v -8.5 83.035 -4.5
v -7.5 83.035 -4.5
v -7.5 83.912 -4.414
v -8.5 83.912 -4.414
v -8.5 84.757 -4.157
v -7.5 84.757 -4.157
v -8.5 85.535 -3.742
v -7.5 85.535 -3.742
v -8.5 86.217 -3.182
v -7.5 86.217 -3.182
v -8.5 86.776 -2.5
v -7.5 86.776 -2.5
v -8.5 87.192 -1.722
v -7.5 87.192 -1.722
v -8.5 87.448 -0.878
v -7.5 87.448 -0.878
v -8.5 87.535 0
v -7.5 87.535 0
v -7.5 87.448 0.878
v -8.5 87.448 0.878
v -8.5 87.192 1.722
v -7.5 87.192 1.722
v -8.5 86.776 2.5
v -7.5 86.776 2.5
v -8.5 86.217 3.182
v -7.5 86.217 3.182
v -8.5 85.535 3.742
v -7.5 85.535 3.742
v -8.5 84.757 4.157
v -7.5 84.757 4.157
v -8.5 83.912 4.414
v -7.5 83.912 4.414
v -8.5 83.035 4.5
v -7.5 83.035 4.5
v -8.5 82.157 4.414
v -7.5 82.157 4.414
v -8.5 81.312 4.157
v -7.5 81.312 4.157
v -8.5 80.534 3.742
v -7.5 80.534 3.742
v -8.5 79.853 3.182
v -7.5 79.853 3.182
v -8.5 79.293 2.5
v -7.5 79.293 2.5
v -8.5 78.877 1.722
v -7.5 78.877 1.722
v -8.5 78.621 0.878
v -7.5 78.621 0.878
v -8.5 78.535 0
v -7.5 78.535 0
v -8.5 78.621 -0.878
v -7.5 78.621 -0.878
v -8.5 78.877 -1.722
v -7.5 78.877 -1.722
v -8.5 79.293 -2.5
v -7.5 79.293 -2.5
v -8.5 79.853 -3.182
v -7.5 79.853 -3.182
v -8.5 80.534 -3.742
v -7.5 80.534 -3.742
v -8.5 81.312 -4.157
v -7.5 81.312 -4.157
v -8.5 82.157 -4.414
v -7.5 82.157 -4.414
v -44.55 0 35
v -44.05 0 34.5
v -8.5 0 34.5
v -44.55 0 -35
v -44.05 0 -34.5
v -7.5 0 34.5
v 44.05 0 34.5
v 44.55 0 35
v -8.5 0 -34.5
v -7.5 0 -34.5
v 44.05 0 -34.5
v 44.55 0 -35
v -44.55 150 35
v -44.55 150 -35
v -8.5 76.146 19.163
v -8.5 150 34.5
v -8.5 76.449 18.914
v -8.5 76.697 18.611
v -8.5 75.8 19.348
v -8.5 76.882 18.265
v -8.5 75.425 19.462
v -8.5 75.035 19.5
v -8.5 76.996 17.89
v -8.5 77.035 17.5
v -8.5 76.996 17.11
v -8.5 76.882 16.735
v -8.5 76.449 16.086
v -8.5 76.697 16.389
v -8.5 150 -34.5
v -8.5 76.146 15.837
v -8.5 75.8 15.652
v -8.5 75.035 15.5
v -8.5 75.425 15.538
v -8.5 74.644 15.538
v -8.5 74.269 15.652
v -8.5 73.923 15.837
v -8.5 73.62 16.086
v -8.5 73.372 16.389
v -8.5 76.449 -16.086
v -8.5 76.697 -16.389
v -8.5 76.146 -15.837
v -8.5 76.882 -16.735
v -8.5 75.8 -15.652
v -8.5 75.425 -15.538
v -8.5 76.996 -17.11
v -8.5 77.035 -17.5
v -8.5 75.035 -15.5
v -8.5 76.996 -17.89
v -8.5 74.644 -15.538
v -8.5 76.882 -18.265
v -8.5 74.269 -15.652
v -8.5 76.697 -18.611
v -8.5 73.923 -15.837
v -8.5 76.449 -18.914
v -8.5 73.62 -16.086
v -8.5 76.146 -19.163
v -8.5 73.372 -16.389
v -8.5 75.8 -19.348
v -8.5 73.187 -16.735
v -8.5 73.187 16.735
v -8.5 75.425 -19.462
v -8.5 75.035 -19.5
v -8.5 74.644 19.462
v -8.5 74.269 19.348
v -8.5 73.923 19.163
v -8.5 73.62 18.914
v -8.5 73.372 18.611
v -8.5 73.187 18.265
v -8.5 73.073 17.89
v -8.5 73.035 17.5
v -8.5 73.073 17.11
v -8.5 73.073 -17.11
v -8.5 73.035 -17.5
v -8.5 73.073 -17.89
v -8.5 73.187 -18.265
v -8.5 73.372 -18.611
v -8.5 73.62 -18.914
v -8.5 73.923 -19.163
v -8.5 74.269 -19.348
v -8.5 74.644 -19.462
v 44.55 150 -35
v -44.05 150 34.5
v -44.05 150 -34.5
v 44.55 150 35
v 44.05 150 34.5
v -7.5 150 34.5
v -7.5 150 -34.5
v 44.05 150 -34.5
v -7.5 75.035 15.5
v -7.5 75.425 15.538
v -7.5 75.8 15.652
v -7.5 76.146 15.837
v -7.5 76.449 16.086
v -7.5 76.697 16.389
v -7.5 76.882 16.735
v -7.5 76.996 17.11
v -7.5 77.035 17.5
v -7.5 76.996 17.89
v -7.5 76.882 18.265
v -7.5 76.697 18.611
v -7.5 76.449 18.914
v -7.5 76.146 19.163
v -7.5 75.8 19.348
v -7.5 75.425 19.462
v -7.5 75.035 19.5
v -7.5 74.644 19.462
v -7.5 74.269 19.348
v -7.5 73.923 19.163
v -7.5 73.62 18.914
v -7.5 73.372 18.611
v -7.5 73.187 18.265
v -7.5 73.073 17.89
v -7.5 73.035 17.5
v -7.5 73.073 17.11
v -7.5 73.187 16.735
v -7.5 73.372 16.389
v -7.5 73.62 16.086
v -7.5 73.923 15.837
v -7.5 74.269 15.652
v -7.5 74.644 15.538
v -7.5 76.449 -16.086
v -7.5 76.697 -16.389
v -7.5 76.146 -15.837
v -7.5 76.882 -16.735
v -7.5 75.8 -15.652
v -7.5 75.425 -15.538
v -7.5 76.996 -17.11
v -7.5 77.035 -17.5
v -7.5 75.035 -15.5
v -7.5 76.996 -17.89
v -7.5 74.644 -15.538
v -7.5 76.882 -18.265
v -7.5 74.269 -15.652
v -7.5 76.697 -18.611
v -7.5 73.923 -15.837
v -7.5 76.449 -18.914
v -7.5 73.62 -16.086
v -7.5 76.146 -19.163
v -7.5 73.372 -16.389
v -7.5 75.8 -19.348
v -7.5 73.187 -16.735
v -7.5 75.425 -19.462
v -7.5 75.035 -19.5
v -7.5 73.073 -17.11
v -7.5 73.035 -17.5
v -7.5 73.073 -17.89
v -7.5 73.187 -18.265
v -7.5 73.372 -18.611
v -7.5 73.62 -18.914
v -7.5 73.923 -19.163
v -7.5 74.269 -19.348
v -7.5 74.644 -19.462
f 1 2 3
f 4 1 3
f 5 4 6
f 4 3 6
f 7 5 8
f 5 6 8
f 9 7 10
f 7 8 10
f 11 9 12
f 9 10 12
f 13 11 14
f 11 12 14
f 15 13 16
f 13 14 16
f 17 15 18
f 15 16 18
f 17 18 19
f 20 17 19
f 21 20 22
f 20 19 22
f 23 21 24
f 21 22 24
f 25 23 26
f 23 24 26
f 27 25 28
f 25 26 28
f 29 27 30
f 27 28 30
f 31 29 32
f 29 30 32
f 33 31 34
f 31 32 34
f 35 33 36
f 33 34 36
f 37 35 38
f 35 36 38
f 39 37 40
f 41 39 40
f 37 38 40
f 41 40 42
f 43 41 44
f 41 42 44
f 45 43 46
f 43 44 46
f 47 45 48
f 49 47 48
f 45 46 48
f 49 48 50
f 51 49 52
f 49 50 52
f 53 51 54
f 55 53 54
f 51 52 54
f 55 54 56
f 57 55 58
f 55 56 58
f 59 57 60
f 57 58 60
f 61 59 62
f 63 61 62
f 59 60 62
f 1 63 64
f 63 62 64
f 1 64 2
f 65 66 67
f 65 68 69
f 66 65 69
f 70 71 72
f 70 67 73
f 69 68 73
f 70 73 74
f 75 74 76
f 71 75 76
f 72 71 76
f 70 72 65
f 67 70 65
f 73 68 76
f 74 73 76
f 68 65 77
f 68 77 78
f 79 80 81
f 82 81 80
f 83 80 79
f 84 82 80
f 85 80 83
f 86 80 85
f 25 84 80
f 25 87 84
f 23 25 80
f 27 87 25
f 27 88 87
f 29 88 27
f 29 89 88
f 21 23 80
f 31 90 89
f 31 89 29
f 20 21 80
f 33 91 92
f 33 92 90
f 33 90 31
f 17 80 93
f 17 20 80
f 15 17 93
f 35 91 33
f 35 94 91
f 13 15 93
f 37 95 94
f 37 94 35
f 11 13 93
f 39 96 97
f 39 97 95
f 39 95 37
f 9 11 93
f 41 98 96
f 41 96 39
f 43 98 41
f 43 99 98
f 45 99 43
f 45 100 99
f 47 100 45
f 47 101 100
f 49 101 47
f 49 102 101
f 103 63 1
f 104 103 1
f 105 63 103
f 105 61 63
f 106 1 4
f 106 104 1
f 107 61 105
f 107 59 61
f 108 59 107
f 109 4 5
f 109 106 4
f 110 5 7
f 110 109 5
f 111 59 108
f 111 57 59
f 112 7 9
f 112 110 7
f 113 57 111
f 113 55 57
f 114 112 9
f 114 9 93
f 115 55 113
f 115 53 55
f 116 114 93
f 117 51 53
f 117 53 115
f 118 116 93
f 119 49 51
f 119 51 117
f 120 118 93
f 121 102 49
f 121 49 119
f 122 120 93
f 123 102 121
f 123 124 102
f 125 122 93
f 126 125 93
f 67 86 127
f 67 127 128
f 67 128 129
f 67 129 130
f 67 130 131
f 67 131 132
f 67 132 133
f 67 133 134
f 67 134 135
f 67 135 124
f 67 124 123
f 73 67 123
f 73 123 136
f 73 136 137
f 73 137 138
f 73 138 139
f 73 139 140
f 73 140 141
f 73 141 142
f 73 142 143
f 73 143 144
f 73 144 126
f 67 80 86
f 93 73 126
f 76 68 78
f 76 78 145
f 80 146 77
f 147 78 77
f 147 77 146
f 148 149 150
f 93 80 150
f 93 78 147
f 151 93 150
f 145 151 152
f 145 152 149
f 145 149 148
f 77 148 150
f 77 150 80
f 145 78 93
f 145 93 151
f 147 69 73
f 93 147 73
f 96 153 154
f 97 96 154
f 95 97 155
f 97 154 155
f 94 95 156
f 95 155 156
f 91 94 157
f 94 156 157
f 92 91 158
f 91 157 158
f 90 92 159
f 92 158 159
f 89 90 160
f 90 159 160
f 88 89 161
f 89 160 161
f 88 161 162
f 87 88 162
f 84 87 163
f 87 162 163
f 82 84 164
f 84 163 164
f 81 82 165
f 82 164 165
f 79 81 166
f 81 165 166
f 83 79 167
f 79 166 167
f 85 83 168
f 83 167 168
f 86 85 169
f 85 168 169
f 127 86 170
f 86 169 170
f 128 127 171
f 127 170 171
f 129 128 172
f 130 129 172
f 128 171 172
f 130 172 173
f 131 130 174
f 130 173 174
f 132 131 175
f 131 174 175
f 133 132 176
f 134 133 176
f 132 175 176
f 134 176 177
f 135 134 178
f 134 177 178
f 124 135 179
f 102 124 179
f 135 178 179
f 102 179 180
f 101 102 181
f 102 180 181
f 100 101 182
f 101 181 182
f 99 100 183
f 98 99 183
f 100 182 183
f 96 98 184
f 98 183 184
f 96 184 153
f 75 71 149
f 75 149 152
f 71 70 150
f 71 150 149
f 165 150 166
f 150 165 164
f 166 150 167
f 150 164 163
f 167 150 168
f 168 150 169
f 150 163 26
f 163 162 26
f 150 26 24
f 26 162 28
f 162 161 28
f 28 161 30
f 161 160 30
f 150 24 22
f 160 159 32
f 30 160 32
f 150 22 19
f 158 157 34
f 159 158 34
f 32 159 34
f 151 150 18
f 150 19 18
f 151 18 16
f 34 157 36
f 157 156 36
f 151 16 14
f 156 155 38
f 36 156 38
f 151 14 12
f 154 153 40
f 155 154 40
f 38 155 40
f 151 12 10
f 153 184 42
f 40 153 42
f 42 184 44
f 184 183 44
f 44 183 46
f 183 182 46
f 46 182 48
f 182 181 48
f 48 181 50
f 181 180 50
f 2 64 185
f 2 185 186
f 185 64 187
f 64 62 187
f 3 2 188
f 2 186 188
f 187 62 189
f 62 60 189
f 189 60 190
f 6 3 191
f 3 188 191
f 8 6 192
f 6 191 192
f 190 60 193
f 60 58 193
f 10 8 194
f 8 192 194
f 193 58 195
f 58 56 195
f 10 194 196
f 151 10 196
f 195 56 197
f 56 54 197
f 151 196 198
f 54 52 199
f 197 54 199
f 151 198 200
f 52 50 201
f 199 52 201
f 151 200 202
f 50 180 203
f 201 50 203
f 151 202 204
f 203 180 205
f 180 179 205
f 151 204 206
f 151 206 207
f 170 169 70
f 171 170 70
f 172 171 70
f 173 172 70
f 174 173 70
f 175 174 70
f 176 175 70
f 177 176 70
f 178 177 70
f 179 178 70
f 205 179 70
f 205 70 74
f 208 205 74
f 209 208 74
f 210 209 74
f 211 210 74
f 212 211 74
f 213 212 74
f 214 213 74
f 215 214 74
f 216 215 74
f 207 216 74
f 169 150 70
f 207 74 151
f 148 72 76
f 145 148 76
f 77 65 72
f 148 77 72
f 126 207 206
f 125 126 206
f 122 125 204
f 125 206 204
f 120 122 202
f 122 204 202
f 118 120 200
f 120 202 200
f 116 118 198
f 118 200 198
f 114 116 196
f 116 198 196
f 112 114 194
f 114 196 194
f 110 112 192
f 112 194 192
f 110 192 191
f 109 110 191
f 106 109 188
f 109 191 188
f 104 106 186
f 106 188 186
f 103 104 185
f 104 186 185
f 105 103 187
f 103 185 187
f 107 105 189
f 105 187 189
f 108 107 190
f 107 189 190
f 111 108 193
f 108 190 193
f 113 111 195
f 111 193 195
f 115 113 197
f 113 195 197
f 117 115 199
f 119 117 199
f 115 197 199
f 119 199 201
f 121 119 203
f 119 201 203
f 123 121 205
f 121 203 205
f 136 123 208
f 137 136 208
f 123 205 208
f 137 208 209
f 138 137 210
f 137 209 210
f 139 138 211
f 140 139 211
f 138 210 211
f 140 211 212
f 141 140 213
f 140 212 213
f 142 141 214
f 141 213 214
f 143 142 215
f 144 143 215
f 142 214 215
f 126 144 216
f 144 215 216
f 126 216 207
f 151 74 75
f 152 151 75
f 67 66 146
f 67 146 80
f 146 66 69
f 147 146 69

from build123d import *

# Parameters (mm, degrees)
ESBO_O1_W                = 89.1
ESBO_O1_H                = 70
ESBO_O1_W_2              = 51.55
ESBO_O1_H_2              = 69
ESBO_O1_W_3              = 35.55
RESSALTO_EXTRUS_O1_DEPTH = 150
ESBO_O3_R                = 2
ESBO_O3_R_2              = 4.5
CORTE_EXTRUS_O1_DEPTH    = 1


with BuildPart() as part:
    # Esboço1 → Ressalto-extrusão1 (new body)
    with BuildSketch(Plane(origin=(0, 0, 0), x_dir=(1, 0, 0), z_dir=(0, 1, 0))):
        Rectangle(ESBO_O1_W, ESBO_O1_H)
        with Locations((18.275, 0)):
            Rectangle(ESBO_O1_W_2, ESBO_O1_H_2, mode=Mode.SUBTRACT)
        with Locations((-26.275, 0)):
            Rectangle(ESBO_O1_W_3, ESBO_O1_H_2, mode=Mode.SUBTRACT)
    extrude(amount=RESSALTO_EXTRUS_O1_DEPTH)

    # Esboço3 → Corte-extrusão1 (cut)
    with BuildSketch(Plane(origin=(-7.5, 0, 0), x_dir=(0, 0, -1), z_dir=(1, 0, 0))):
        with Locations((17.5, 75.034551114)):
            Circle(ESBO_O3_R)
        with Locations((-17.5, 75.034551114)):
            Circle(ESBO_O3_R)
        with Locations((0, 83.034551114)):
            Circle(ESBO_O3_R_2)
    extrude(amount=-CORTE_EXTRUS_O1_DEPTH, mode=Mode.SUBTRACT)


solid = part.part
